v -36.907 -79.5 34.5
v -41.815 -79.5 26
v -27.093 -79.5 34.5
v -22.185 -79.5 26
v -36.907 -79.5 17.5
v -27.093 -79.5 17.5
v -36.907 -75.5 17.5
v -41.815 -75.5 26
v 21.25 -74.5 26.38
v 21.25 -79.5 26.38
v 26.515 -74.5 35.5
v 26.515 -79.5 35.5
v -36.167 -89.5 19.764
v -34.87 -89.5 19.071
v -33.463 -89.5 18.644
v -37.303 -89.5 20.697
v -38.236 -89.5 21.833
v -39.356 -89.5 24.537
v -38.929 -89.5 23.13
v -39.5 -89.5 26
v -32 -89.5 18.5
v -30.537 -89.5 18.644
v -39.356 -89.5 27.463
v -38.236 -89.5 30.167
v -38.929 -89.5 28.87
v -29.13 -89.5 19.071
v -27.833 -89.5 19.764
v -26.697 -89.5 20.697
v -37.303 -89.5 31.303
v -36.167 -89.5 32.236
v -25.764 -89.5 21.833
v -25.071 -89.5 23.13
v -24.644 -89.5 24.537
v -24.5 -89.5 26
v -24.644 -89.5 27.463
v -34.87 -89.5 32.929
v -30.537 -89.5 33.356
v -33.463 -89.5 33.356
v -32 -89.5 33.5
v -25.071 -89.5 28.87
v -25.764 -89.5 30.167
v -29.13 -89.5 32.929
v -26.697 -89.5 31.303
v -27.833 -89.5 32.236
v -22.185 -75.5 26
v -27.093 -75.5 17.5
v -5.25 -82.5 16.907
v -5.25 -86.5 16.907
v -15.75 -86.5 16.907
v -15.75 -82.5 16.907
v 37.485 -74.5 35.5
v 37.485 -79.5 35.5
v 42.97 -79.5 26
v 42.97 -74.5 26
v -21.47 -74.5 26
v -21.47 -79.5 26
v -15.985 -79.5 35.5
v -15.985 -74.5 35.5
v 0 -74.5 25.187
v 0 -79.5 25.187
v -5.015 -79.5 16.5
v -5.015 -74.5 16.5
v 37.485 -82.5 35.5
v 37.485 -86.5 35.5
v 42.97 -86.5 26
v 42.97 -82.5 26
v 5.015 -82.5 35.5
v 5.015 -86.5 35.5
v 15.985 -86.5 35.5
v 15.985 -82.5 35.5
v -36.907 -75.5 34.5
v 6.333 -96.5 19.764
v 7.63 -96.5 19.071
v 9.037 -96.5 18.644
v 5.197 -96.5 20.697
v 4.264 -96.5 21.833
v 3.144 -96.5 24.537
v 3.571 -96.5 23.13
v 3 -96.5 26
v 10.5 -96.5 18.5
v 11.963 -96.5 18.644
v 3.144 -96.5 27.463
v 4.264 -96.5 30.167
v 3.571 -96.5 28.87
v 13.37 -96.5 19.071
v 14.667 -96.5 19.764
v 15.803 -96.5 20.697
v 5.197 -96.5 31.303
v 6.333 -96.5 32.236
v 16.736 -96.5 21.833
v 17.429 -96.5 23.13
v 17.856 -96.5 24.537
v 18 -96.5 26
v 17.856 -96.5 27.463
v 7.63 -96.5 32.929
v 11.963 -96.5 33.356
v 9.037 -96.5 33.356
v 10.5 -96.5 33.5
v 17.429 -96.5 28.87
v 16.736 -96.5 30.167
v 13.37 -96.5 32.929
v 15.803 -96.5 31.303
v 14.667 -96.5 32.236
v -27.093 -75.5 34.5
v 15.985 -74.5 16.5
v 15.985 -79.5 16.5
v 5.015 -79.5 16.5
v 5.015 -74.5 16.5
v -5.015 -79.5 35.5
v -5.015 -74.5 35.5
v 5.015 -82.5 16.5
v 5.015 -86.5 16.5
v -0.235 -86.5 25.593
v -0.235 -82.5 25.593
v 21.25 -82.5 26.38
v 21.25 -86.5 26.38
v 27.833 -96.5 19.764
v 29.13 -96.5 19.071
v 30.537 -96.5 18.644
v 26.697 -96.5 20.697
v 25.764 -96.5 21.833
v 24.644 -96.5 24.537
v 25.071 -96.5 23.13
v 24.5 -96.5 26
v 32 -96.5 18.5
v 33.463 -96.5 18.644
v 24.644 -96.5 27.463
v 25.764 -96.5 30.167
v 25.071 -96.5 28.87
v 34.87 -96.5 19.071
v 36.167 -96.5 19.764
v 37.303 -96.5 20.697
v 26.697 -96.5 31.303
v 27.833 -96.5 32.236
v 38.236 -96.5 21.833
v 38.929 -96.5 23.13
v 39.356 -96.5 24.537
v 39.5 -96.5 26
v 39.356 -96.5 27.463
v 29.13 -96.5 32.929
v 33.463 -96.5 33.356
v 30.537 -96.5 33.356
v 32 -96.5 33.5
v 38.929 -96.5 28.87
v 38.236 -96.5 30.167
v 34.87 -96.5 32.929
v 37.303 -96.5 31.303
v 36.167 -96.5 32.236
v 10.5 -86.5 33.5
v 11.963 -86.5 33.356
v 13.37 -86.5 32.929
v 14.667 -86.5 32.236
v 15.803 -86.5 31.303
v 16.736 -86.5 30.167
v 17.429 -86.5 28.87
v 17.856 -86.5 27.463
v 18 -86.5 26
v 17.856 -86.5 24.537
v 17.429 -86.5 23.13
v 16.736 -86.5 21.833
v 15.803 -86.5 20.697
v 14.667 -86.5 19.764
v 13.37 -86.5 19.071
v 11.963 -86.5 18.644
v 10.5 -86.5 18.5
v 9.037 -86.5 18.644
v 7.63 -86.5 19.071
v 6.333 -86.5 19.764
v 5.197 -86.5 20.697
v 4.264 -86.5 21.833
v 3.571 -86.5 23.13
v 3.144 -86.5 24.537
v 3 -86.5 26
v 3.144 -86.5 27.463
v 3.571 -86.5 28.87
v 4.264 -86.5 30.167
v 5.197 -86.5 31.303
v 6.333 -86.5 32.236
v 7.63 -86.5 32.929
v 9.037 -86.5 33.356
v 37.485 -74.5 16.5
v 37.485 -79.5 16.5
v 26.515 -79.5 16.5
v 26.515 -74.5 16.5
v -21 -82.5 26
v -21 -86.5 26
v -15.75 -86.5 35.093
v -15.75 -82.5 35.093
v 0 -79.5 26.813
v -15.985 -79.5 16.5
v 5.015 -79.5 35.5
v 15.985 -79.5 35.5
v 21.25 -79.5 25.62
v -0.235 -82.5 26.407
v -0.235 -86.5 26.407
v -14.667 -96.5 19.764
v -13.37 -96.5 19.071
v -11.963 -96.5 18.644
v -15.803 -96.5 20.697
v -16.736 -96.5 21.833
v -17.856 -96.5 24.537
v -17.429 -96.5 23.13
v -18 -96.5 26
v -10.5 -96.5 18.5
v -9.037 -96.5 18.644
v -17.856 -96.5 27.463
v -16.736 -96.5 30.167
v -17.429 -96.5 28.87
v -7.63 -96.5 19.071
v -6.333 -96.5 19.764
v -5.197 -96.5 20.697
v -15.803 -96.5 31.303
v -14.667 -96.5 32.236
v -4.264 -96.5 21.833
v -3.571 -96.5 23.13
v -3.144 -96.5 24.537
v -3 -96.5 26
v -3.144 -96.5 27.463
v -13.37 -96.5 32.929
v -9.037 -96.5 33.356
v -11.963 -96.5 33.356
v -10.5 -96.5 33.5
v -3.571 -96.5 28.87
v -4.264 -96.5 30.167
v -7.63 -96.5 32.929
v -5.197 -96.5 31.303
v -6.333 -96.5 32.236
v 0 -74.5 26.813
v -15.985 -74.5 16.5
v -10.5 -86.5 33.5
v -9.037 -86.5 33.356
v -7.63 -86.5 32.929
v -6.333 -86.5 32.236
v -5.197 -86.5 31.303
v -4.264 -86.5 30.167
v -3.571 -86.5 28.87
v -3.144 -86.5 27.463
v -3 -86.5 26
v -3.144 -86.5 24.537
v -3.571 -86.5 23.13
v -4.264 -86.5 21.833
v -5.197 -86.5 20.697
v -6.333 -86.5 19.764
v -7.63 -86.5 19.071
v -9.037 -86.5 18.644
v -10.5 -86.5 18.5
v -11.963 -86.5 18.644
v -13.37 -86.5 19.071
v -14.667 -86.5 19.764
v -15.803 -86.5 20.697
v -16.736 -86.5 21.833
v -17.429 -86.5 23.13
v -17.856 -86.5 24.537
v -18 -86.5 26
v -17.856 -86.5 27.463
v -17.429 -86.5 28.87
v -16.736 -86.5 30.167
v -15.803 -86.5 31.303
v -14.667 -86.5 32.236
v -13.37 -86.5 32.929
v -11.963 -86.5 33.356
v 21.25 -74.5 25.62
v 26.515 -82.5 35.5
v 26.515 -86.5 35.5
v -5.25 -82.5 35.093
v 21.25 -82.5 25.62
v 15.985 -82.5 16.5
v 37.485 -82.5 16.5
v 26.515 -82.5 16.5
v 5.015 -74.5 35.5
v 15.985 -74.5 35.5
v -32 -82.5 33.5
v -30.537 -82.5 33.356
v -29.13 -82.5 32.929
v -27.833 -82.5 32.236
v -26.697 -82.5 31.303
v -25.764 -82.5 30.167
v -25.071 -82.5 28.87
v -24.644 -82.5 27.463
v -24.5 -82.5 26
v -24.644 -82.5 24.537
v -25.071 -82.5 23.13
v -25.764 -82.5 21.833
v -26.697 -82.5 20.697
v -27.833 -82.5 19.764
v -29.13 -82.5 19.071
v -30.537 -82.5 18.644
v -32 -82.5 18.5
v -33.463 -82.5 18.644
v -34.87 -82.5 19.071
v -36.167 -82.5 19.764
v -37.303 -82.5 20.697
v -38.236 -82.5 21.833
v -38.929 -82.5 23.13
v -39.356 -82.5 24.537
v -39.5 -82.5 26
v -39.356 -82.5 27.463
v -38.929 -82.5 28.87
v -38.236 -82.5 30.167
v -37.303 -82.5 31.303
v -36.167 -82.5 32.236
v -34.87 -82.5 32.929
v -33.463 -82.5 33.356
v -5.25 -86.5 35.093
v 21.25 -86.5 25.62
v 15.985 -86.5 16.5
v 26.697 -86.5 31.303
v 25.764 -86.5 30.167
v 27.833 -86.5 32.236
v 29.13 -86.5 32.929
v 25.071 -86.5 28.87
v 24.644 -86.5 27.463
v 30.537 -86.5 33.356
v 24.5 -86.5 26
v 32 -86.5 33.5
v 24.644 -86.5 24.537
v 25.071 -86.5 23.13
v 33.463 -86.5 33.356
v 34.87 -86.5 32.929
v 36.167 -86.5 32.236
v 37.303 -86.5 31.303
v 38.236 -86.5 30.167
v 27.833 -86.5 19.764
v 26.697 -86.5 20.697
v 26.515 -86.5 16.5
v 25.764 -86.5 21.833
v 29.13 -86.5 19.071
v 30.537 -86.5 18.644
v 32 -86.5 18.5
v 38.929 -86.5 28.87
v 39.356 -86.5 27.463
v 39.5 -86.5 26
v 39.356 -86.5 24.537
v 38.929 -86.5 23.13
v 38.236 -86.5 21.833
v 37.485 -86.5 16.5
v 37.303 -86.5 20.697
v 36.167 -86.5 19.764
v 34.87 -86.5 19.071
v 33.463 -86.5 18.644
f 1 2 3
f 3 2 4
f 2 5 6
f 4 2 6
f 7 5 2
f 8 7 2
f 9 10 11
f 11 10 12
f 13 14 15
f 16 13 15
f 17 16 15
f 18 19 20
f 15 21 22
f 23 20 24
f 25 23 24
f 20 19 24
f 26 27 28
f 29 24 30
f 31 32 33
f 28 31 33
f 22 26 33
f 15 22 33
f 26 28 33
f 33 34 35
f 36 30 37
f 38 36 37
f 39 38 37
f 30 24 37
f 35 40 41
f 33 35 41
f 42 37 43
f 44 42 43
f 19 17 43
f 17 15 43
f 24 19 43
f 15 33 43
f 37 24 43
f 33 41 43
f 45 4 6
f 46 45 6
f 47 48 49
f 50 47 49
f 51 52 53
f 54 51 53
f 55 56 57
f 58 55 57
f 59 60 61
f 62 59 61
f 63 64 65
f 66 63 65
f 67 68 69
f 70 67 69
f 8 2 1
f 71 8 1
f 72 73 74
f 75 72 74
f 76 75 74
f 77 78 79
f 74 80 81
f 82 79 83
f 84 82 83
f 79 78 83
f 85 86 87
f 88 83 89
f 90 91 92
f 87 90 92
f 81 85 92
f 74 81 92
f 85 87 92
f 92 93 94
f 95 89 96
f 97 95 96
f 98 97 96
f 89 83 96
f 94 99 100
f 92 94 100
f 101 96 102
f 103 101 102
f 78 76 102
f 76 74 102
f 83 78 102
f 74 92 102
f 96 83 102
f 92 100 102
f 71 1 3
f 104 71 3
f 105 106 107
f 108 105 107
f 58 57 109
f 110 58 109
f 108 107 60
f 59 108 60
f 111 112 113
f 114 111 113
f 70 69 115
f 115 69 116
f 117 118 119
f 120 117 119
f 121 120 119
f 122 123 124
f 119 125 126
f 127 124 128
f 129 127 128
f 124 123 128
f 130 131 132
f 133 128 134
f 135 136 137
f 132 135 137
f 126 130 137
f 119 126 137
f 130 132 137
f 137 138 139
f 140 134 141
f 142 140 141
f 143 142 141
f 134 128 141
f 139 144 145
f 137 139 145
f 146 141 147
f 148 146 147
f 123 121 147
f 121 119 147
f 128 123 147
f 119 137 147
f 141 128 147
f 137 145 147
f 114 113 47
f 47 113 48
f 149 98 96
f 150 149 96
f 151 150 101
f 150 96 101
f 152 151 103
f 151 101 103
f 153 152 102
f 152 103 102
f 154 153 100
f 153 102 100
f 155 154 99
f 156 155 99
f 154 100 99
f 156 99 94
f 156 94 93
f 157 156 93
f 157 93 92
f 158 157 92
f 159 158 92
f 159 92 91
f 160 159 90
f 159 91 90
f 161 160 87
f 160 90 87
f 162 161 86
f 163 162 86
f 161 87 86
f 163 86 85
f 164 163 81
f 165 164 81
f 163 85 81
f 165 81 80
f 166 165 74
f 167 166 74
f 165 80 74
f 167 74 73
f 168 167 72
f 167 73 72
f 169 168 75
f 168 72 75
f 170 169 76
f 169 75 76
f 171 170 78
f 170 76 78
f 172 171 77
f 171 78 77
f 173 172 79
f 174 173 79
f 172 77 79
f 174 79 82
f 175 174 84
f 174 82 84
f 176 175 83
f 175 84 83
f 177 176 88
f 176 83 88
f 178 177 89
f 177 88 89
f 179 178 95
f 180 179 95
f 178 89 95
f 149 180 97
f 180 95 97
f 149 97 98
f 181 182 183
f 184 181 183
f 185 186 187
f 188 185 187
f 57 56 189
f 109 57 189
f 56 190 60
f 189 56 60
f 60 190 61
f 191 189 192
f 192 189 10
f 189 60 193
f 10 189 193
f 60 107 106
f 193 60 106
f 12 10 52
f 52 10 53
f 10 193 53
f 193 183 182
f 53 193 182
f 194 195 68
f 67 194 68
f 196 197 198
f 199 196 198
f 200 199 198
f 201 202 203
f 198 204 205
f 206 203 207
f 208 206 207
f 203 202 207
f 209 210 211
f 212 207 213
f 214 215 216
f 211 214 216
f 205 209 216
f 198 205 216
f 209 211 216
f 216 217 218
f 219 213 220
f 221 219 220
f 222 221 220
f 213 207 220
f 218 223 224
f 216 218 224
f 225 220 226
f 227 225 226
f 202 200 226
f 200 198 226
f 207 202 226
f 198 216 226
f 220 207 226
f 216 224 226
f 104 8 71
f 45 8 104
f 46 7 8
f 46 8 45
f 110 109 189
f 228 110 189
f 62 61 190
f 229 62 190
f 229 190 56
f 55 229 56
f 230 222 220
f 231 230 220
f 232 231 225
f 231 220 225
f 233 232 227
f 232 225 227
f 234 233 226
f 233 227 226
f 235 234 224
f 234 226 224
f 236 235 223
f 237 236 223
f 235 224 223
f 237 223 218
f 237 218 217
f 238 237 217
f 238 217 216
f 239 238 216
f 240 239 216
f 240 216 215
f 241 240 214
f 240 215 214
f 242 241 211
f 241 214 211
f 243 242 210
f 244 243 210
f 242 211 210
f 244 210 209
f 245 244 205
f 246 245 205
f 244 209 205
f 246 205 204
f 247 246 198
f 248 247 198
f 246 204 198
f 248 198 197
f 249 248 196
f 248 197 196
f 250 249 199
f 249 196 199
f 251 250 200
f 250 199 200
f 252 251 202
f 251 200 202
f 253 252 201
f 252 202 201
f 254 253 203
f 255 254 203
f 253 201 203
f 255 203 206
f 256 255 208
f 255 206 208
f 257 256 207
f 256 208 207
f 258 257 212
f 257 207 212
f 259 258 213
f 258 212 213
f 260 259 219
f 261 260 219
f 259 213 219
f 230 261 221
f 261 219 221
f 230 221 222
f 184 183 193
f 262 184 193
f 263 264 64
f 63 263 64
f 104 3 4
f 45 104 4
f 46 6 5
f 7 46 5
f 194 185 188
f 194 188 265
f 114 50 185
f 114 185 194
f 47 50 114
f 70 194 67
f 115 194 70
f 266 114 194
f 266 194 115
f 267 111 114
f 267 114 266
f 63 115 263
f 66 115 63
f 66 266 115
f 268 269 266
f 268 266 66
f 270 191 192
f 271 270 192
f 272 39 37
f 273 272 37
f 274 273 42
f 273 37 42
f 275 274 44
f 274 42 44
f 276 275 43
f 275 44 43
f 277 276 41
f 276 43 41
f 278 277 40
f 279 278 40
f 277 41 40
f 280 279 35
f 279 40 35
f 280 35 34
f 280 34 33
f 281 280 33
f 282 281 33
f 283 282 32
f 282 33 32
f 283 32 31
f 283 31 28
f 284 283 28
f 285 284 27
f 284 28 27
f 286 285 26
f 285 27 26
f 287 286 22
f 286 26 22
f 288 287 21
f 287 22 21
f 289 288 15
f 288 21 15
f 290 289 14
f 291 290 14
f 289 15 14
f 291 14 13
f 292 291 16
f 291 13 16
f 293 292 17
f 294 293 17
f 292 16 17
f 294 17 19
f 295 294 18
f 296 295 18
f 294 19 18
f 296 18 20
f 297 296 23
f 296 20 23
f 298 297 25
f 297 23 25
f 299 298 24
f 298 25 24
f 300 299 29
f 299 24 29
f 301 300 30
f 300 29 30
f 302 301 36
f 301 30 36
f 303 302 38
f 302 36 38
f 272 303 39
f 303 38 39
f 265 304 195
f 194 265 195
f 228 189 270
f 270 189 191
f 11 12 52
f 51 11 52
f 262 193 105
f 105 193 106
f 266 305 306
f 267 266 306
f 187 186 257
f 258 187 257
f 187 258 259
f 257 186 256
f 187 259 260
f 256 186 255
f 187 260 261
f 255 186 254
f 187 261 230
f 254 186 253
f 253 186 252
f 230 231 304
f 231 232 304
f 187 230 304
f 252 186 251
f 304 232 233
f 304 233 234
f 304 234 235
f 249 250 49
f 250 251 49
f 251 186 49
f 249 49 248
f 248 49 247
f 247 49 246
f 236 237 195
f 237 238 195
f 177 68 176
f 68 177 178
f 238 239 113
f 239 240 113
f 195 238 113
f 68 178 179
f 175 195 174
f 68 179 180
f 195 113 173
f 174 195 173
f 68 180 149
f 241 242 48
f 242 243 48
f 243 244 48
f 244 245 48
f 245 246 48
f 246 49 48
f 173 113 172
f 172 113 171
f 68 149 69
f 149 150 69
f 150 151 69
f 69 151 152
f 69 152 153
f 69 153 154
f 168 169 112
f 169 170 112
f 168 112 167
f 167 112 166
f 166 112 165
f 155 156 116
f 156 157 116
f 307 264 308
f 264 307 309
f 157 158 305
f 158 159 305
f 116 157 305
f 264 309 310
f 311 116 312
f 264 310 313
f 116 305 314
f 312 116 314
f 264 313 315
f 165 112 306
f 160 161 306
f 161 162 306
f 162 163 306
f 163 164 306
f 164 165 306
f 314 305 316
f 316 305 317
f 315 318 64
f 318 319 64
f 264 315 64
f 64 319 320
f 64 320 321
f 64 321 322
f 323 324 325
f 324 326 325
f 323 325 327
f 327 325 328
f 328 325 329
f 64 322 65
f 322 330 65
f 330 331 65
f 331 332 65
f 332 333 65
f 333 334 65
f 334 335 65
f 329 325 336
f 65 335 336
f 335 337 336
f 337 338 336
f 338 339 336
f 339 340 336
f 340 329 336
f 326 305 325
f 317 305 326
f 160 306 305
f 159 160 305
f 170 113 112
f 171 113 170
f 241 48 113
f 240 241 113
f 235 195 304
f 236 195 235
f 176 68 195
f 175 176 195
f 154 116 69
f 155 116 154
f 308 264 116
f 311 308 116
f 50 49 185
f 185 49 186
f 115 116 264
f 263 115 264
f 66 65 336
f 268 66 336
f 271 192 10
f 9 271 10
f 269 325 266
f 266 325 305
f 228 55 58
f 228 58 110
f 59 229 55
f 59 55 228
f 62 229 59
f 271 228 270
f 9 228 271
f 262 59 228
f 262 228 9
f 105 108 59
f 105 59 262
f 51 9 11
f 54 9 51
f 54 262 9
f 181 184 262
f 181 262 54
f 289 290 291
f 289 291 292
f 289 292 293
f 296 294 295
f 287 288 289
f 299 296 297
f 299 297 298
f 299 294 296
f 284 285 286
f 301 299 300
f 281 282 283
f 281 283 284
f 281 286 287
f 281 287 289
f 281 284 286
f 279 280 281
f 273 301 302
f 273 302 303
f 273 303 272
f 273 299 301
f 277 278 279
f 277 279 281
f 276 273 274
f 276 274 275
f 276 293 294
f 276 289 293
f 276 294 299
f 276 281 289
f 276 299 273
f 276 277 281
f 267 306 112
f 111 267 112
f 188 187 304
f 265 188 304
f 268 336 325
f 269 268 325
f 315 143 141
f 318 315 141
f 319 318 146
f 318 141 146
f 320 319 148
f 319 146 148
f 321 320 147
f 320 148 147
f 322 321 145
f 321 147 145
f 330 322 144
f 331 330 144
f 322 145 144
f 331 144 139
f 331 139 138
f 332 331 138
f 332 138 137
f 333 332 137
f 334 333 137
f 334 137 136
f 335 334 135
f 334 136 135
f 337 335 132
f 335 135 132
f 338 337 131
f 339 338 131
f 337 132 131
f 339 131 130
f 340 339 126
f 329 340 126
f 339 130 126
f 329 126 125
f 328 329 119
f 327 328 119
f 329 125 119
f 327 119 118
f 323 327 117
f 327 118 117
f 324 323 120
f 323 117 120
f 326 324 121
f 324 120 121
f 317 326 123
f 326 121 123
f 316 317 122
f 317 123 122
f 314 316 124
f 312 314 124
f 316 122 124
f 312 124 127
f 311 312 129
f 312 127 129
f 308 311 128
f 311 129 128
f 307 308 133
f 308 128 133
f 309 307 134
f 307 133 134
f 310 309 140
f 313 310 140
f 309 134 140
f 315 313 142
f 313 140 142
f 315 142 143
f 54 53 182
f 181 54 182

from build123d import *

# Parameters (mm, degrees)
BOSS_EXTRUDE1_DEPTH  = 4
SKETCH2_R            = 7.5
BOSS_EXTRUDE2_DEPTH  = 10
BOSS_EXTRUDE3_DEPTH  = 5
BOSS_EXTRUDE4_DEPTH  = 4
SKETCH5_R            = 7.5
BOSS_EXTRUDE5_DEPTH  = 10
BOSS_EXTRUDE6_DEPTH  = 5
BOSS_EXTRUDE7_DEPTH  = 4
SKETCH8_R            = 7.5
BOSS_EXTRUDE8_DEPTH  = 10
BOSS_EXTRUDE9_DEPTH  = 5
SKETCH10_R           = 7.5
BOSS_EXTRUDE10_DEPTH = 7
BOSS_EXTRUDE11_DEPTH = 4


with BuildPart() as part:
    # Sketch1 → Boss-Extrude1 (new body)
    with BuildSketch(Plane(origin=(0, -86.5, 0), x_dir=(1, 0, 0), z_dir=(0, 1, 0))):
        Polygon((0, -26), (-5.25, -16.90673326), (-15.75, -16.90673326), (-21, -26), (-15.75, -35.09326674), (-5.25, -35.09326674), align=None)
    extrude(amount=BOSS_EXTRUDE1_DEPTH)

    # Sketch2 → Boss-Extrude2 (add)
    with BuildSketch(Plane(origin=(0, -96.5, 0), x_dir=(1, 0, 0), z_dir=(0, 1, 0))):
        with Locations(Location((-10.5, -26, 0), (0, 0, 270))):
            Circle(SKETCH2_R)
    extrude(amount=BOSS_EXTRUDE2_DEPTH)

    # Sketch4 → Boss-Extrude4 (add)
    with BuildSketch(Plane(origin=(0, -86.5, 0), x_dir=(1, 0, 0), z_dir=(0, 1, 0))):
        Polygon((21.469655115, -26), (15.984827557, -16.5), (5.015172443, -16.5), (-0.469655115, -26), (5.015172443, -35.5), (15.984827557, -35.5), align=None)
    extrude(amount=BOSS_EXTRUDE4_DEPTH)

    # Sketch5 → Boss-Extrude5 (add)
    with BuildSketch(Plane(origin=(0, -96.5, 0), x_dir=(1, 0, 0), z_dir=(0, 1, 0))):
        with Locations(Location((10.5, -26, 0), (0, 0, 270))):
            Circle(SKETCH5_R)
    extrude(amount=BOSS_EXTRUDE5_DEPTH)

    # Sketch7 → Boss-Extrude7 (add)
    with BuildSketch(Plane(origin=(0, -86.5, 0), x_dir=(1, 0, 0), z_dir=(0, 1, 0))):
        Polygon((42.969655115, -26), (37.484827557, -16.5), (26.515172443, -16.5), (21.030344885, -26), (26.515172443, -35.5), (37.484827557, -35.5), align=None)
    extrude(amount=BOSS_EXTRUDE7_DEPTH)

    # Sketch8 → Boss-Extrude8 (add)
    with BuildSketch(Plane(origin=(0, -96.5, 0), x_dir=(1, 0, 0), z_dir=(0, 1, 0))):
        with Locations(Location((32, -26, 0), (0, 0, 270))):
            Circle(SKETCH8_R)
    extrude(amount=BOSS_EXTRUDE8_DEPTH)


with BuildPart() as body_2:
    # Sketch3 → Boss-Extrude3 (new body)
    with BuildSketch(Plane(origin=(0, -79.5, 0), x_dir=(1, 0, 0), z_dir=(0, 1, 0))):
        Polygon((0.469655115, -26), (-5.015172443, -16.5), (-15.984827557, -16.5), (-21.469655115, -26), (-15.984827557, -35.5), (-5.015172443, -35.5), align=None)
    extrude(amount=BOSS_EXTRUDE3_DEPTH)

    # Sketch6 → Boss-Extrude6 (add)
    with BuildSketch(Plane(origin=(0, -79.5, 0), x_dir=(1, 0, 0), z_dir=(0, 1, 0))):
        Polygon((21.469655115, -26), (15.984827557, -16.5), (5.015172443, -16.5), (-0.469655115, -26), (5.015172443, -35.5), (15.984827557, -35.5), align=None)
    extrude(amount=BOSS_EXTRUDE6_DEPTH)

    # Sketch9 → Boss-Extrude9 (add)
    with BuildSketch(Plane(origin=(0, -79.5, 0), x_dir=(1, 0, 0), z_dir=(0, 1, 0))):
        Polygon((42.969655115, -26), (37.484827557, -16.5), (26.515172443, -16.5), (21.030344885, -26), (26.515172443, -35.5), (37.484827557, -35.5), align=None)
    extrude(amount=BOSS_EXTRUDE9_DEPTH)


with BuildPart() as body_3:
    # Sketch10 → Boss-Extrude10 (new body)
    with BuildSketch(Plane(origin=(0, -89.5, 0), x_dir=(1, 0, 0), z_dir=(0, 1, 0))):
        with Locations(Location((-32, -26, 0), (0, 0, 270))):
            Circle(SKETCH10_R)
    extrude(amount=BOSS_EXTRUDE10_DEPTH)


with BuildPart() as body_4:
    # Sketch11 → Boss-Extrude11 (new body)
    with BuildSketch(Plane(origin=(0, -79.5, 0), x_dir=(1, 0, 0), z_dir=(0, 1, 0))):
        Polygon((-22.185045424, -26), (-27.092522712, -17.5), (-36.907477288, -17.5), (-41.814954576, -26), (-36.907477288, -34.5), (-27.092522712, -34.5), align=None)
    extrude(amount=BOSS_EXTRUDE11_DEPTH)


solid = Compound([part.part, body_2.part, body_3.part, body_4.part])
